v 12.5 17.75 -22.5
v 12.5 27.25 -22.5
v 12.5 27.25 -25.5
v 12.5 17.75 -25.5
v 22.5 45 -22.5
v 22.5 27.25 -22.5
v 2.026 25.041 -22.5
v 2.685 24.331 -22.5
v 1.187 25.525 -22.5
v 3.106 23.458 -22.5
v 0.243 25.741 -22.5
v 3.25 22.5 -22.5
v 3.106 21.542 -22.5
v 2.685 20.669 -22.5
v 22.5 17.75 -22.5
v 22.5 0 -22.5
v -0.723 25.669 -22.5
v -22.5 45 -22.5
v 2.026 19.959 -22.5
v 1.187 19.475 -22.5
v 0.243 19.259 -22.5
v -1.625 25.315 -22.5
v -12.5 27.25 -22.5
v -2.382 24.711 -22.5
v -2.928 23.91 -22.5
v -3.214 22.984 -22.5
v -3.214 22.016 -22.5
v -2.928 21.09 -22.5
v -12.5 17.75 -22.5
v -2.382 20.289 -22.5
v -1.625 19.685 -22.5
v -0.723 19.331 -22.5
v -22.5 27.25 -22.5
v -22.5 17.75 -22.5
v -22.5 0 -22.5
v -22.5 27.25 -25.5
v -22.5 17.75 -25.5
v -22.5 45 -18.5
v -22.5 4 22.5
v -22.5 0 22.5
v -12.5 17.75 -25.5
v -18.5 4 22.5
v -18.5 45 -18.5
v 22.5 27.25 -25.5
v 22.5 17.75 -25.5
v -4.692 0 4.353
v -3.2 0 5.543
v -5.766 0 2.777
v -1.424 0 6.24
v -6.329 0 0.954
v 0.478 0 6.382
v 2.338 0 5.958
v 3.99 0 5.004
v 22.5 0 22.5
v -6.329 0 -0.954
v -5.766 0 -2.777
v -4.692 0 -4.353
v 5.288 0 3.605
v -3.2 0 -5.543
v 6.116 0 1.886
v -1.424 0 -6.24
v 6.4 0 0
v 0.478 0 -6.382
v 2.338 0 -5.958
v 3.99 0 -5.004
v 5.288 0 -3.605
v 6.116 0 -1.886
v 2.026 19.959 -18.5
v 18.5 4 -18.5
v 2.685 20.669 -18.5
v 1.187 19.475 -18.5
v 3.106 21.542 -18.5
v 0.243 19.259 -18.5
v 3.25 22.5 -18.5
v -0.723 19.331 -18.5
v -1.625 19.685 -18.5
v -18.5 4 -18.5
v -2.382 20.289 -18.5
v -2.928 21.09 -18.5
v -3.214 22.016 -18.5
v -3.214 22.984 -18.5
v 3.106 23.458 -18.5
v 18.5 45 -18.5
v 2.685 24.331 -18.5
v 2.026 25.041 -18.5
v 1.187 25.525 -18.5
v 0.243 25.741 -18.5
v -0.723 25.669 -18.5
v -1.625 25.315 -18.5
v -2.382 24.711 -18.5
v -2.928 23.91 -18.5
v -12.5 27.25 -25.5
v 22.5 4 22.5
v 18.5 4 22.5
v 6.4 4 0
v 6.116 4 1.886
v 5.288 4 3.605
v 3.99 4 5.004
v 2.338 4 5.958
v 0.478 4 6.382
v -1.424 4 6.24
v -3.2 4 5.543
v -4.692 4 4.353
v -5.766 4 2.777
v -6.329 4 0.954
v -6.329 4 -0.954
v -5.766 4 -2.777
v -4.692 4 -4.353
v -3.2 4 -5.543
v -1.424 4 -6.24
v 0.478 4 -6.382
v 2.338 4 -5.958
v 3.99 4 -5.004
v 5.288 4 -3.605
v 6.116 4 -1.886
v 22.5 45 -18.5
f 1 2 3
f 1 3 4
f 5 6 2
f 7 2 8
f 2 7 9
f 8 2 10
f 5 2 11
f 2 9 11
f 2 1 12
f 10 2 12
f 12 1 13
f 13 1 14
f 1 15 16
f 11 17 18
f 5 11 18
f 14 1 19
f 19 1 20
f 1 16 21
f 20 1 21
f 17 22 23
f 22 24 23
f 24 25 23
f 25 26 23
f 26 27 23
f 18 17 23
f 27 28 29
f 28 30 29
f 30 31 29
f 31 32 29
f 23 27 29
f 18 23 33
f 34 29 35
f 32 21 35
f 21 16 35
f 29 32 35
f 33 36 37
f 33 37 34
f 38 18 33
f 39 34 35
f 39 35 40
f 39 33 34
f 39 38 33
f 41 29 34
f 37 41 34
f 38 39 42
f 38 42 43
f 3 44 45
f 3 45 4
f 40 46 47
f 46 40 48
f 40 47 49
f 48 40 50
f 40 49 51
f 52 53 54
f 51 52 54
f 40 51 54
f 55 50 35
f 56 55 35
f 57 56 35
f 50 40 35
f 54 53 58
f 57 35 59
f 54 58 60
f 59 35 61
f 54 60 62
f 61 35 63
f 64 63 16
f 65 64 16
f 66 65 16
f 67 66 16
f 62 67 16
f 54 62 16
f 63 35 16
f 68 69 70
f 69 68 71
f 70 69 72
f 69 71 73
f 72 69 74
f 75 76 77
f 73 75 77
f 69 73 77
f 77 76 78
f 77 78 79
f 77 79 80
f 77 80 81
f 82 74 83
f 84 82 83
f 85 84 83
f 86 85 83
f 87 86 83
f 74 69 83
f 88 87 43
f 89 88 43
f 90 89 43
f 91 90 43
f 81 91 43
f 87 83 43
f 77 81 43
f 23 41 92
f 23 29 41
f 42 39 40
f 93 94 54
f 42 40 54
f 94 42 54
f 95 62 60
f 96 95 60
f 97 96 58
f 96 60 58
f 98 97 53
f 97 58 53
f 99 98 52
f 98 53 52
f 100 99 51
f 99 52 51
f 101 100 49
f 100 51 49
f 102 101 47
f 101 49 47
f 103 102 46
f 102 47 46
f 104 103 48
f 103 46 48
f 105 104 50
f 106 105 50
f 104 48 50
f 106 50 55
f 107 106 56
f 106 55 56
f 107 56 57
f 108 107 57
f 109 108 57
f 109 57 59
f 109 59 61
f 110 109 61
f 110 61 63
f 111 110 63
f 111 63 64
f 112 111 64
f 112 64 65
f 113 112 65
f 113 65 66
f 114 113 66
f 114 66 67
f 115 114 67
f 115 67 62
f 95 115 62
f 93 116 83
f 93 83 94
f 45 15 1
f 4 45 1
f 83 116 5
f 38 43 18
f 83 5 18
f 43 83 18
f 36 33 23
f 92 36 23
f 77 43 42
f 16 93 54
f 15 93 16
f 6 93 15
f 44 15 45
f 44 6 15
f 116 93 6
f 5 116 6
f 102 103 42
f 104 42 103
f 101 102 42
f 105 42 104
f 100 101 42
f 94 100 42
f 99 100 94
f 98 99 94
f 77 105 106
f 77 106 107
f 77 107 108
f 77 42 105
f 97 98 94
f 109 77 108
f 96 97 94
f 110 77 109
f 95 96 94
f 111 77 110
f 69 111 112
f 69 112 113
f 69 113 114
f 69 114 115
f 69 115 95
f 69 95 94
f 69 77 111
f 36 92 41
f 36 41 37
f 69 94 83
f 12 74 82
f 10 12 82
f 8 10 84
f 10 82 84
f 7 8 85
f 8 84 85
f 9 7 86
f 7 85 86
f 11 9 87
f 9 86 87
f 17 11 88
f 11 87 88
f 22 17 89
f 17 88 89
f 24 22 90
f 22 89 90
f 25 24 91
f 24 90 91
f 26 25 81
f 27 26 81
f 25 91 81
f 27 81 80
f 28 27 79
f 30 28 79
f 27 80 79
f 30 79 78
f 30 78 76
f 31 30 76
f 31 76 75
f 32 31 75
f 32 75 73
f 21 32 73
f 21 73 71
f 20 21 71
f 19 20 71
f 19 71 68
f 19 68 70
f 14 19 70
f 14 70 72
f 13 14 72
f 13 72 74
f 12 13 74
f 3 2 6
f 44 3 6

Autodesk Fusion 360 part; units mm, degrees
sketch "Sketch1" plane through (0, 0, 0) normal (0, 1, 0) x (1, 0, 0)
  line L0 (22.5, 22.5) -> (-22.5, 22.5)
  line L1 (-22.5, 22.5) -> (-22.5, -22.5)
  line L2 (-22.5, -22.5) -> (22.5, -22.5)
  line L3 (22.5, -22.5) -> (22.5, 22.5)
  line L4 (22.5, 22.5) -> (-22.5, -22.5) construction
  line L5 (-22.5, 22.5) -> (22.5, -22.5) construction
  dimension "d1" = 45
  dimension "d2" = 45
extrude "Extrude1" add sketch "Sketch1" along normal blind 4
sketch "Sketch2" plane through (0, 0, -22.5) normal (0, 0, -1) x (-1, 0, 0)
  line L0 (22.5, 0) -> (-22.5, 0)
  line L1 (-22.5, 0) -> (-22.5, 45)
  line L2 (-22.5, 45) -> (22.5, 45)
  line L3 (22.5, 45) -> (22.5, 0)
  point P0 (-22.5, 0)
  point P1 (22.5, 0)
  dimension "d12" = 45
extrude "Extrude4" add sketch "Sketch2" against normal blind 4
sketch "Sketch3" plane through (-22.5, 0, 0) normal (-1, 0, 0) x (0, 0, 1)
  line L0 (-22.5, 0) -> (22.5, 0)
  line L1 (22.5, 0) -> (22.5, 4)
  line L2 (22.5, 4) -> (-18.5, 4)
  line L3 (-22.5, 45) -> (-22.5, 0)
  line L4 (-18.5, 45) -> (-18.5, 4)
  line L5 (22.5, 4) -> (-18.5, 45)
  line L6 (-18.5, 4) -> (-18.5, 45)
  line L7 (-18.5, 45) -> (-22.5, 45)
extrude "Extrude3" add sketch "Sketch3" against normal blind 4 contours L2 L4 L5 L6
mirror "Mirror1" about plane through (0, 0, 0) normal (1, 0, 0) of "Extrude3"
sketch "Sketch6" plane through (0, 0, -22.5) normal (0, 0, -1) x (-1, 0, 0)
  line L0 (-22.5, 0) -> (22.5, 0)
  line L1 (22.5, 0) -> (22.5, 45)
  line L2 (22.5, 45) -> (-22.5, 45)
  line L3 (-22.5, 45) -> (-22.5, 0)
  line L4 (22.5, 27.25) -> (-22.5, 27.25)
  line L5 (-22.5, 27.25) -> (-22.5, 17.75)
  line L6 (-22.5, 17.75) -> (22.5, 17.75)
  line L7 (22.5, 17.75) -> (22.5, 27.25)
  line L8 (22.5, 27.25) -> (-22.5, 17.75) construction
  line L9 (-22.5, 27.25) -> (22.5, 17.75) construction
  line L10 (0, 0) -> (0, 6.5) construction
  line L11 (12.5, 27.25) -> (-12.5, 27.25)
  line L12 (-12.5, 27.25) -> (-12.5, 17.75)
  line L13 (-12.5, 17.75) -> (12.5, 17.75)
  line L14 (12.5, 17.75) -> (12.5, 27.25)
  line L15 (12.5, 27.25) -> (-12.5, 17.75) construction
  line L16 (-12.5, 27.25) -> (12.5, 17.75) construction
  point P0 (0, 22.5)
  point P1 (0, 22.5)
  dimension "d31" = 9.5
  dimension "d32" = 22.5
  dimension "d35" = 25
extrude "Extrude7" add sketch "Sketch6" along normal blind 3 contours L3 L4 L5 L6 L12 | L1 L4 L6 L7 L14
sketch "Sketch4" plane through (0, 0, -18.5) normal (0, 0, 1) x (1, 0, 0)
  line L0 (18.5, 45) -> (-18.5, 45)
  line L1 (-18.5, 45) -> (-18.5, 4)
  line L2 (-18.5, 4) -> (18.5, 4)
  line L3 (22.5, 45) -> (-22.5, 45)
  line L4 (-22.5, 0) -> (22.5, 0)
  line L5 (0, 0) -> (0, 20.1593) construction
  circle A0 centre (0, 22.5) radius 3.25
  dimension "d29" = 6.5
  dimension "d30" = 22.5
extrude "Extrude5" cut sketch "Sketch4" against normal through all
sketch "Sketch5" plane through (0, 0, 0) normal (0, -1, 0) x (1, 0, 0)
  line L0 (22.5, -22.5) -> (22.5, 22.5)
  line L1 (-22.5, 22.5) -> (-22.5, -22.5)
  line L2 (-22.5, -22.5) -> (22.5, -22.5)
  line L3 (-22.5, -22.5) -> (22.5, -22.5)
  circle A0 centre (0, 0) radius 6.4
  dimension "d28" = 12.8
extrude "Extrude6" cut sketch "Sketch5" against normal blind 4
equation "d30 = ( 45 / 2 ) * 1 mm"
equation "d32 = ( 45 / 2 ) * 1 mm"
